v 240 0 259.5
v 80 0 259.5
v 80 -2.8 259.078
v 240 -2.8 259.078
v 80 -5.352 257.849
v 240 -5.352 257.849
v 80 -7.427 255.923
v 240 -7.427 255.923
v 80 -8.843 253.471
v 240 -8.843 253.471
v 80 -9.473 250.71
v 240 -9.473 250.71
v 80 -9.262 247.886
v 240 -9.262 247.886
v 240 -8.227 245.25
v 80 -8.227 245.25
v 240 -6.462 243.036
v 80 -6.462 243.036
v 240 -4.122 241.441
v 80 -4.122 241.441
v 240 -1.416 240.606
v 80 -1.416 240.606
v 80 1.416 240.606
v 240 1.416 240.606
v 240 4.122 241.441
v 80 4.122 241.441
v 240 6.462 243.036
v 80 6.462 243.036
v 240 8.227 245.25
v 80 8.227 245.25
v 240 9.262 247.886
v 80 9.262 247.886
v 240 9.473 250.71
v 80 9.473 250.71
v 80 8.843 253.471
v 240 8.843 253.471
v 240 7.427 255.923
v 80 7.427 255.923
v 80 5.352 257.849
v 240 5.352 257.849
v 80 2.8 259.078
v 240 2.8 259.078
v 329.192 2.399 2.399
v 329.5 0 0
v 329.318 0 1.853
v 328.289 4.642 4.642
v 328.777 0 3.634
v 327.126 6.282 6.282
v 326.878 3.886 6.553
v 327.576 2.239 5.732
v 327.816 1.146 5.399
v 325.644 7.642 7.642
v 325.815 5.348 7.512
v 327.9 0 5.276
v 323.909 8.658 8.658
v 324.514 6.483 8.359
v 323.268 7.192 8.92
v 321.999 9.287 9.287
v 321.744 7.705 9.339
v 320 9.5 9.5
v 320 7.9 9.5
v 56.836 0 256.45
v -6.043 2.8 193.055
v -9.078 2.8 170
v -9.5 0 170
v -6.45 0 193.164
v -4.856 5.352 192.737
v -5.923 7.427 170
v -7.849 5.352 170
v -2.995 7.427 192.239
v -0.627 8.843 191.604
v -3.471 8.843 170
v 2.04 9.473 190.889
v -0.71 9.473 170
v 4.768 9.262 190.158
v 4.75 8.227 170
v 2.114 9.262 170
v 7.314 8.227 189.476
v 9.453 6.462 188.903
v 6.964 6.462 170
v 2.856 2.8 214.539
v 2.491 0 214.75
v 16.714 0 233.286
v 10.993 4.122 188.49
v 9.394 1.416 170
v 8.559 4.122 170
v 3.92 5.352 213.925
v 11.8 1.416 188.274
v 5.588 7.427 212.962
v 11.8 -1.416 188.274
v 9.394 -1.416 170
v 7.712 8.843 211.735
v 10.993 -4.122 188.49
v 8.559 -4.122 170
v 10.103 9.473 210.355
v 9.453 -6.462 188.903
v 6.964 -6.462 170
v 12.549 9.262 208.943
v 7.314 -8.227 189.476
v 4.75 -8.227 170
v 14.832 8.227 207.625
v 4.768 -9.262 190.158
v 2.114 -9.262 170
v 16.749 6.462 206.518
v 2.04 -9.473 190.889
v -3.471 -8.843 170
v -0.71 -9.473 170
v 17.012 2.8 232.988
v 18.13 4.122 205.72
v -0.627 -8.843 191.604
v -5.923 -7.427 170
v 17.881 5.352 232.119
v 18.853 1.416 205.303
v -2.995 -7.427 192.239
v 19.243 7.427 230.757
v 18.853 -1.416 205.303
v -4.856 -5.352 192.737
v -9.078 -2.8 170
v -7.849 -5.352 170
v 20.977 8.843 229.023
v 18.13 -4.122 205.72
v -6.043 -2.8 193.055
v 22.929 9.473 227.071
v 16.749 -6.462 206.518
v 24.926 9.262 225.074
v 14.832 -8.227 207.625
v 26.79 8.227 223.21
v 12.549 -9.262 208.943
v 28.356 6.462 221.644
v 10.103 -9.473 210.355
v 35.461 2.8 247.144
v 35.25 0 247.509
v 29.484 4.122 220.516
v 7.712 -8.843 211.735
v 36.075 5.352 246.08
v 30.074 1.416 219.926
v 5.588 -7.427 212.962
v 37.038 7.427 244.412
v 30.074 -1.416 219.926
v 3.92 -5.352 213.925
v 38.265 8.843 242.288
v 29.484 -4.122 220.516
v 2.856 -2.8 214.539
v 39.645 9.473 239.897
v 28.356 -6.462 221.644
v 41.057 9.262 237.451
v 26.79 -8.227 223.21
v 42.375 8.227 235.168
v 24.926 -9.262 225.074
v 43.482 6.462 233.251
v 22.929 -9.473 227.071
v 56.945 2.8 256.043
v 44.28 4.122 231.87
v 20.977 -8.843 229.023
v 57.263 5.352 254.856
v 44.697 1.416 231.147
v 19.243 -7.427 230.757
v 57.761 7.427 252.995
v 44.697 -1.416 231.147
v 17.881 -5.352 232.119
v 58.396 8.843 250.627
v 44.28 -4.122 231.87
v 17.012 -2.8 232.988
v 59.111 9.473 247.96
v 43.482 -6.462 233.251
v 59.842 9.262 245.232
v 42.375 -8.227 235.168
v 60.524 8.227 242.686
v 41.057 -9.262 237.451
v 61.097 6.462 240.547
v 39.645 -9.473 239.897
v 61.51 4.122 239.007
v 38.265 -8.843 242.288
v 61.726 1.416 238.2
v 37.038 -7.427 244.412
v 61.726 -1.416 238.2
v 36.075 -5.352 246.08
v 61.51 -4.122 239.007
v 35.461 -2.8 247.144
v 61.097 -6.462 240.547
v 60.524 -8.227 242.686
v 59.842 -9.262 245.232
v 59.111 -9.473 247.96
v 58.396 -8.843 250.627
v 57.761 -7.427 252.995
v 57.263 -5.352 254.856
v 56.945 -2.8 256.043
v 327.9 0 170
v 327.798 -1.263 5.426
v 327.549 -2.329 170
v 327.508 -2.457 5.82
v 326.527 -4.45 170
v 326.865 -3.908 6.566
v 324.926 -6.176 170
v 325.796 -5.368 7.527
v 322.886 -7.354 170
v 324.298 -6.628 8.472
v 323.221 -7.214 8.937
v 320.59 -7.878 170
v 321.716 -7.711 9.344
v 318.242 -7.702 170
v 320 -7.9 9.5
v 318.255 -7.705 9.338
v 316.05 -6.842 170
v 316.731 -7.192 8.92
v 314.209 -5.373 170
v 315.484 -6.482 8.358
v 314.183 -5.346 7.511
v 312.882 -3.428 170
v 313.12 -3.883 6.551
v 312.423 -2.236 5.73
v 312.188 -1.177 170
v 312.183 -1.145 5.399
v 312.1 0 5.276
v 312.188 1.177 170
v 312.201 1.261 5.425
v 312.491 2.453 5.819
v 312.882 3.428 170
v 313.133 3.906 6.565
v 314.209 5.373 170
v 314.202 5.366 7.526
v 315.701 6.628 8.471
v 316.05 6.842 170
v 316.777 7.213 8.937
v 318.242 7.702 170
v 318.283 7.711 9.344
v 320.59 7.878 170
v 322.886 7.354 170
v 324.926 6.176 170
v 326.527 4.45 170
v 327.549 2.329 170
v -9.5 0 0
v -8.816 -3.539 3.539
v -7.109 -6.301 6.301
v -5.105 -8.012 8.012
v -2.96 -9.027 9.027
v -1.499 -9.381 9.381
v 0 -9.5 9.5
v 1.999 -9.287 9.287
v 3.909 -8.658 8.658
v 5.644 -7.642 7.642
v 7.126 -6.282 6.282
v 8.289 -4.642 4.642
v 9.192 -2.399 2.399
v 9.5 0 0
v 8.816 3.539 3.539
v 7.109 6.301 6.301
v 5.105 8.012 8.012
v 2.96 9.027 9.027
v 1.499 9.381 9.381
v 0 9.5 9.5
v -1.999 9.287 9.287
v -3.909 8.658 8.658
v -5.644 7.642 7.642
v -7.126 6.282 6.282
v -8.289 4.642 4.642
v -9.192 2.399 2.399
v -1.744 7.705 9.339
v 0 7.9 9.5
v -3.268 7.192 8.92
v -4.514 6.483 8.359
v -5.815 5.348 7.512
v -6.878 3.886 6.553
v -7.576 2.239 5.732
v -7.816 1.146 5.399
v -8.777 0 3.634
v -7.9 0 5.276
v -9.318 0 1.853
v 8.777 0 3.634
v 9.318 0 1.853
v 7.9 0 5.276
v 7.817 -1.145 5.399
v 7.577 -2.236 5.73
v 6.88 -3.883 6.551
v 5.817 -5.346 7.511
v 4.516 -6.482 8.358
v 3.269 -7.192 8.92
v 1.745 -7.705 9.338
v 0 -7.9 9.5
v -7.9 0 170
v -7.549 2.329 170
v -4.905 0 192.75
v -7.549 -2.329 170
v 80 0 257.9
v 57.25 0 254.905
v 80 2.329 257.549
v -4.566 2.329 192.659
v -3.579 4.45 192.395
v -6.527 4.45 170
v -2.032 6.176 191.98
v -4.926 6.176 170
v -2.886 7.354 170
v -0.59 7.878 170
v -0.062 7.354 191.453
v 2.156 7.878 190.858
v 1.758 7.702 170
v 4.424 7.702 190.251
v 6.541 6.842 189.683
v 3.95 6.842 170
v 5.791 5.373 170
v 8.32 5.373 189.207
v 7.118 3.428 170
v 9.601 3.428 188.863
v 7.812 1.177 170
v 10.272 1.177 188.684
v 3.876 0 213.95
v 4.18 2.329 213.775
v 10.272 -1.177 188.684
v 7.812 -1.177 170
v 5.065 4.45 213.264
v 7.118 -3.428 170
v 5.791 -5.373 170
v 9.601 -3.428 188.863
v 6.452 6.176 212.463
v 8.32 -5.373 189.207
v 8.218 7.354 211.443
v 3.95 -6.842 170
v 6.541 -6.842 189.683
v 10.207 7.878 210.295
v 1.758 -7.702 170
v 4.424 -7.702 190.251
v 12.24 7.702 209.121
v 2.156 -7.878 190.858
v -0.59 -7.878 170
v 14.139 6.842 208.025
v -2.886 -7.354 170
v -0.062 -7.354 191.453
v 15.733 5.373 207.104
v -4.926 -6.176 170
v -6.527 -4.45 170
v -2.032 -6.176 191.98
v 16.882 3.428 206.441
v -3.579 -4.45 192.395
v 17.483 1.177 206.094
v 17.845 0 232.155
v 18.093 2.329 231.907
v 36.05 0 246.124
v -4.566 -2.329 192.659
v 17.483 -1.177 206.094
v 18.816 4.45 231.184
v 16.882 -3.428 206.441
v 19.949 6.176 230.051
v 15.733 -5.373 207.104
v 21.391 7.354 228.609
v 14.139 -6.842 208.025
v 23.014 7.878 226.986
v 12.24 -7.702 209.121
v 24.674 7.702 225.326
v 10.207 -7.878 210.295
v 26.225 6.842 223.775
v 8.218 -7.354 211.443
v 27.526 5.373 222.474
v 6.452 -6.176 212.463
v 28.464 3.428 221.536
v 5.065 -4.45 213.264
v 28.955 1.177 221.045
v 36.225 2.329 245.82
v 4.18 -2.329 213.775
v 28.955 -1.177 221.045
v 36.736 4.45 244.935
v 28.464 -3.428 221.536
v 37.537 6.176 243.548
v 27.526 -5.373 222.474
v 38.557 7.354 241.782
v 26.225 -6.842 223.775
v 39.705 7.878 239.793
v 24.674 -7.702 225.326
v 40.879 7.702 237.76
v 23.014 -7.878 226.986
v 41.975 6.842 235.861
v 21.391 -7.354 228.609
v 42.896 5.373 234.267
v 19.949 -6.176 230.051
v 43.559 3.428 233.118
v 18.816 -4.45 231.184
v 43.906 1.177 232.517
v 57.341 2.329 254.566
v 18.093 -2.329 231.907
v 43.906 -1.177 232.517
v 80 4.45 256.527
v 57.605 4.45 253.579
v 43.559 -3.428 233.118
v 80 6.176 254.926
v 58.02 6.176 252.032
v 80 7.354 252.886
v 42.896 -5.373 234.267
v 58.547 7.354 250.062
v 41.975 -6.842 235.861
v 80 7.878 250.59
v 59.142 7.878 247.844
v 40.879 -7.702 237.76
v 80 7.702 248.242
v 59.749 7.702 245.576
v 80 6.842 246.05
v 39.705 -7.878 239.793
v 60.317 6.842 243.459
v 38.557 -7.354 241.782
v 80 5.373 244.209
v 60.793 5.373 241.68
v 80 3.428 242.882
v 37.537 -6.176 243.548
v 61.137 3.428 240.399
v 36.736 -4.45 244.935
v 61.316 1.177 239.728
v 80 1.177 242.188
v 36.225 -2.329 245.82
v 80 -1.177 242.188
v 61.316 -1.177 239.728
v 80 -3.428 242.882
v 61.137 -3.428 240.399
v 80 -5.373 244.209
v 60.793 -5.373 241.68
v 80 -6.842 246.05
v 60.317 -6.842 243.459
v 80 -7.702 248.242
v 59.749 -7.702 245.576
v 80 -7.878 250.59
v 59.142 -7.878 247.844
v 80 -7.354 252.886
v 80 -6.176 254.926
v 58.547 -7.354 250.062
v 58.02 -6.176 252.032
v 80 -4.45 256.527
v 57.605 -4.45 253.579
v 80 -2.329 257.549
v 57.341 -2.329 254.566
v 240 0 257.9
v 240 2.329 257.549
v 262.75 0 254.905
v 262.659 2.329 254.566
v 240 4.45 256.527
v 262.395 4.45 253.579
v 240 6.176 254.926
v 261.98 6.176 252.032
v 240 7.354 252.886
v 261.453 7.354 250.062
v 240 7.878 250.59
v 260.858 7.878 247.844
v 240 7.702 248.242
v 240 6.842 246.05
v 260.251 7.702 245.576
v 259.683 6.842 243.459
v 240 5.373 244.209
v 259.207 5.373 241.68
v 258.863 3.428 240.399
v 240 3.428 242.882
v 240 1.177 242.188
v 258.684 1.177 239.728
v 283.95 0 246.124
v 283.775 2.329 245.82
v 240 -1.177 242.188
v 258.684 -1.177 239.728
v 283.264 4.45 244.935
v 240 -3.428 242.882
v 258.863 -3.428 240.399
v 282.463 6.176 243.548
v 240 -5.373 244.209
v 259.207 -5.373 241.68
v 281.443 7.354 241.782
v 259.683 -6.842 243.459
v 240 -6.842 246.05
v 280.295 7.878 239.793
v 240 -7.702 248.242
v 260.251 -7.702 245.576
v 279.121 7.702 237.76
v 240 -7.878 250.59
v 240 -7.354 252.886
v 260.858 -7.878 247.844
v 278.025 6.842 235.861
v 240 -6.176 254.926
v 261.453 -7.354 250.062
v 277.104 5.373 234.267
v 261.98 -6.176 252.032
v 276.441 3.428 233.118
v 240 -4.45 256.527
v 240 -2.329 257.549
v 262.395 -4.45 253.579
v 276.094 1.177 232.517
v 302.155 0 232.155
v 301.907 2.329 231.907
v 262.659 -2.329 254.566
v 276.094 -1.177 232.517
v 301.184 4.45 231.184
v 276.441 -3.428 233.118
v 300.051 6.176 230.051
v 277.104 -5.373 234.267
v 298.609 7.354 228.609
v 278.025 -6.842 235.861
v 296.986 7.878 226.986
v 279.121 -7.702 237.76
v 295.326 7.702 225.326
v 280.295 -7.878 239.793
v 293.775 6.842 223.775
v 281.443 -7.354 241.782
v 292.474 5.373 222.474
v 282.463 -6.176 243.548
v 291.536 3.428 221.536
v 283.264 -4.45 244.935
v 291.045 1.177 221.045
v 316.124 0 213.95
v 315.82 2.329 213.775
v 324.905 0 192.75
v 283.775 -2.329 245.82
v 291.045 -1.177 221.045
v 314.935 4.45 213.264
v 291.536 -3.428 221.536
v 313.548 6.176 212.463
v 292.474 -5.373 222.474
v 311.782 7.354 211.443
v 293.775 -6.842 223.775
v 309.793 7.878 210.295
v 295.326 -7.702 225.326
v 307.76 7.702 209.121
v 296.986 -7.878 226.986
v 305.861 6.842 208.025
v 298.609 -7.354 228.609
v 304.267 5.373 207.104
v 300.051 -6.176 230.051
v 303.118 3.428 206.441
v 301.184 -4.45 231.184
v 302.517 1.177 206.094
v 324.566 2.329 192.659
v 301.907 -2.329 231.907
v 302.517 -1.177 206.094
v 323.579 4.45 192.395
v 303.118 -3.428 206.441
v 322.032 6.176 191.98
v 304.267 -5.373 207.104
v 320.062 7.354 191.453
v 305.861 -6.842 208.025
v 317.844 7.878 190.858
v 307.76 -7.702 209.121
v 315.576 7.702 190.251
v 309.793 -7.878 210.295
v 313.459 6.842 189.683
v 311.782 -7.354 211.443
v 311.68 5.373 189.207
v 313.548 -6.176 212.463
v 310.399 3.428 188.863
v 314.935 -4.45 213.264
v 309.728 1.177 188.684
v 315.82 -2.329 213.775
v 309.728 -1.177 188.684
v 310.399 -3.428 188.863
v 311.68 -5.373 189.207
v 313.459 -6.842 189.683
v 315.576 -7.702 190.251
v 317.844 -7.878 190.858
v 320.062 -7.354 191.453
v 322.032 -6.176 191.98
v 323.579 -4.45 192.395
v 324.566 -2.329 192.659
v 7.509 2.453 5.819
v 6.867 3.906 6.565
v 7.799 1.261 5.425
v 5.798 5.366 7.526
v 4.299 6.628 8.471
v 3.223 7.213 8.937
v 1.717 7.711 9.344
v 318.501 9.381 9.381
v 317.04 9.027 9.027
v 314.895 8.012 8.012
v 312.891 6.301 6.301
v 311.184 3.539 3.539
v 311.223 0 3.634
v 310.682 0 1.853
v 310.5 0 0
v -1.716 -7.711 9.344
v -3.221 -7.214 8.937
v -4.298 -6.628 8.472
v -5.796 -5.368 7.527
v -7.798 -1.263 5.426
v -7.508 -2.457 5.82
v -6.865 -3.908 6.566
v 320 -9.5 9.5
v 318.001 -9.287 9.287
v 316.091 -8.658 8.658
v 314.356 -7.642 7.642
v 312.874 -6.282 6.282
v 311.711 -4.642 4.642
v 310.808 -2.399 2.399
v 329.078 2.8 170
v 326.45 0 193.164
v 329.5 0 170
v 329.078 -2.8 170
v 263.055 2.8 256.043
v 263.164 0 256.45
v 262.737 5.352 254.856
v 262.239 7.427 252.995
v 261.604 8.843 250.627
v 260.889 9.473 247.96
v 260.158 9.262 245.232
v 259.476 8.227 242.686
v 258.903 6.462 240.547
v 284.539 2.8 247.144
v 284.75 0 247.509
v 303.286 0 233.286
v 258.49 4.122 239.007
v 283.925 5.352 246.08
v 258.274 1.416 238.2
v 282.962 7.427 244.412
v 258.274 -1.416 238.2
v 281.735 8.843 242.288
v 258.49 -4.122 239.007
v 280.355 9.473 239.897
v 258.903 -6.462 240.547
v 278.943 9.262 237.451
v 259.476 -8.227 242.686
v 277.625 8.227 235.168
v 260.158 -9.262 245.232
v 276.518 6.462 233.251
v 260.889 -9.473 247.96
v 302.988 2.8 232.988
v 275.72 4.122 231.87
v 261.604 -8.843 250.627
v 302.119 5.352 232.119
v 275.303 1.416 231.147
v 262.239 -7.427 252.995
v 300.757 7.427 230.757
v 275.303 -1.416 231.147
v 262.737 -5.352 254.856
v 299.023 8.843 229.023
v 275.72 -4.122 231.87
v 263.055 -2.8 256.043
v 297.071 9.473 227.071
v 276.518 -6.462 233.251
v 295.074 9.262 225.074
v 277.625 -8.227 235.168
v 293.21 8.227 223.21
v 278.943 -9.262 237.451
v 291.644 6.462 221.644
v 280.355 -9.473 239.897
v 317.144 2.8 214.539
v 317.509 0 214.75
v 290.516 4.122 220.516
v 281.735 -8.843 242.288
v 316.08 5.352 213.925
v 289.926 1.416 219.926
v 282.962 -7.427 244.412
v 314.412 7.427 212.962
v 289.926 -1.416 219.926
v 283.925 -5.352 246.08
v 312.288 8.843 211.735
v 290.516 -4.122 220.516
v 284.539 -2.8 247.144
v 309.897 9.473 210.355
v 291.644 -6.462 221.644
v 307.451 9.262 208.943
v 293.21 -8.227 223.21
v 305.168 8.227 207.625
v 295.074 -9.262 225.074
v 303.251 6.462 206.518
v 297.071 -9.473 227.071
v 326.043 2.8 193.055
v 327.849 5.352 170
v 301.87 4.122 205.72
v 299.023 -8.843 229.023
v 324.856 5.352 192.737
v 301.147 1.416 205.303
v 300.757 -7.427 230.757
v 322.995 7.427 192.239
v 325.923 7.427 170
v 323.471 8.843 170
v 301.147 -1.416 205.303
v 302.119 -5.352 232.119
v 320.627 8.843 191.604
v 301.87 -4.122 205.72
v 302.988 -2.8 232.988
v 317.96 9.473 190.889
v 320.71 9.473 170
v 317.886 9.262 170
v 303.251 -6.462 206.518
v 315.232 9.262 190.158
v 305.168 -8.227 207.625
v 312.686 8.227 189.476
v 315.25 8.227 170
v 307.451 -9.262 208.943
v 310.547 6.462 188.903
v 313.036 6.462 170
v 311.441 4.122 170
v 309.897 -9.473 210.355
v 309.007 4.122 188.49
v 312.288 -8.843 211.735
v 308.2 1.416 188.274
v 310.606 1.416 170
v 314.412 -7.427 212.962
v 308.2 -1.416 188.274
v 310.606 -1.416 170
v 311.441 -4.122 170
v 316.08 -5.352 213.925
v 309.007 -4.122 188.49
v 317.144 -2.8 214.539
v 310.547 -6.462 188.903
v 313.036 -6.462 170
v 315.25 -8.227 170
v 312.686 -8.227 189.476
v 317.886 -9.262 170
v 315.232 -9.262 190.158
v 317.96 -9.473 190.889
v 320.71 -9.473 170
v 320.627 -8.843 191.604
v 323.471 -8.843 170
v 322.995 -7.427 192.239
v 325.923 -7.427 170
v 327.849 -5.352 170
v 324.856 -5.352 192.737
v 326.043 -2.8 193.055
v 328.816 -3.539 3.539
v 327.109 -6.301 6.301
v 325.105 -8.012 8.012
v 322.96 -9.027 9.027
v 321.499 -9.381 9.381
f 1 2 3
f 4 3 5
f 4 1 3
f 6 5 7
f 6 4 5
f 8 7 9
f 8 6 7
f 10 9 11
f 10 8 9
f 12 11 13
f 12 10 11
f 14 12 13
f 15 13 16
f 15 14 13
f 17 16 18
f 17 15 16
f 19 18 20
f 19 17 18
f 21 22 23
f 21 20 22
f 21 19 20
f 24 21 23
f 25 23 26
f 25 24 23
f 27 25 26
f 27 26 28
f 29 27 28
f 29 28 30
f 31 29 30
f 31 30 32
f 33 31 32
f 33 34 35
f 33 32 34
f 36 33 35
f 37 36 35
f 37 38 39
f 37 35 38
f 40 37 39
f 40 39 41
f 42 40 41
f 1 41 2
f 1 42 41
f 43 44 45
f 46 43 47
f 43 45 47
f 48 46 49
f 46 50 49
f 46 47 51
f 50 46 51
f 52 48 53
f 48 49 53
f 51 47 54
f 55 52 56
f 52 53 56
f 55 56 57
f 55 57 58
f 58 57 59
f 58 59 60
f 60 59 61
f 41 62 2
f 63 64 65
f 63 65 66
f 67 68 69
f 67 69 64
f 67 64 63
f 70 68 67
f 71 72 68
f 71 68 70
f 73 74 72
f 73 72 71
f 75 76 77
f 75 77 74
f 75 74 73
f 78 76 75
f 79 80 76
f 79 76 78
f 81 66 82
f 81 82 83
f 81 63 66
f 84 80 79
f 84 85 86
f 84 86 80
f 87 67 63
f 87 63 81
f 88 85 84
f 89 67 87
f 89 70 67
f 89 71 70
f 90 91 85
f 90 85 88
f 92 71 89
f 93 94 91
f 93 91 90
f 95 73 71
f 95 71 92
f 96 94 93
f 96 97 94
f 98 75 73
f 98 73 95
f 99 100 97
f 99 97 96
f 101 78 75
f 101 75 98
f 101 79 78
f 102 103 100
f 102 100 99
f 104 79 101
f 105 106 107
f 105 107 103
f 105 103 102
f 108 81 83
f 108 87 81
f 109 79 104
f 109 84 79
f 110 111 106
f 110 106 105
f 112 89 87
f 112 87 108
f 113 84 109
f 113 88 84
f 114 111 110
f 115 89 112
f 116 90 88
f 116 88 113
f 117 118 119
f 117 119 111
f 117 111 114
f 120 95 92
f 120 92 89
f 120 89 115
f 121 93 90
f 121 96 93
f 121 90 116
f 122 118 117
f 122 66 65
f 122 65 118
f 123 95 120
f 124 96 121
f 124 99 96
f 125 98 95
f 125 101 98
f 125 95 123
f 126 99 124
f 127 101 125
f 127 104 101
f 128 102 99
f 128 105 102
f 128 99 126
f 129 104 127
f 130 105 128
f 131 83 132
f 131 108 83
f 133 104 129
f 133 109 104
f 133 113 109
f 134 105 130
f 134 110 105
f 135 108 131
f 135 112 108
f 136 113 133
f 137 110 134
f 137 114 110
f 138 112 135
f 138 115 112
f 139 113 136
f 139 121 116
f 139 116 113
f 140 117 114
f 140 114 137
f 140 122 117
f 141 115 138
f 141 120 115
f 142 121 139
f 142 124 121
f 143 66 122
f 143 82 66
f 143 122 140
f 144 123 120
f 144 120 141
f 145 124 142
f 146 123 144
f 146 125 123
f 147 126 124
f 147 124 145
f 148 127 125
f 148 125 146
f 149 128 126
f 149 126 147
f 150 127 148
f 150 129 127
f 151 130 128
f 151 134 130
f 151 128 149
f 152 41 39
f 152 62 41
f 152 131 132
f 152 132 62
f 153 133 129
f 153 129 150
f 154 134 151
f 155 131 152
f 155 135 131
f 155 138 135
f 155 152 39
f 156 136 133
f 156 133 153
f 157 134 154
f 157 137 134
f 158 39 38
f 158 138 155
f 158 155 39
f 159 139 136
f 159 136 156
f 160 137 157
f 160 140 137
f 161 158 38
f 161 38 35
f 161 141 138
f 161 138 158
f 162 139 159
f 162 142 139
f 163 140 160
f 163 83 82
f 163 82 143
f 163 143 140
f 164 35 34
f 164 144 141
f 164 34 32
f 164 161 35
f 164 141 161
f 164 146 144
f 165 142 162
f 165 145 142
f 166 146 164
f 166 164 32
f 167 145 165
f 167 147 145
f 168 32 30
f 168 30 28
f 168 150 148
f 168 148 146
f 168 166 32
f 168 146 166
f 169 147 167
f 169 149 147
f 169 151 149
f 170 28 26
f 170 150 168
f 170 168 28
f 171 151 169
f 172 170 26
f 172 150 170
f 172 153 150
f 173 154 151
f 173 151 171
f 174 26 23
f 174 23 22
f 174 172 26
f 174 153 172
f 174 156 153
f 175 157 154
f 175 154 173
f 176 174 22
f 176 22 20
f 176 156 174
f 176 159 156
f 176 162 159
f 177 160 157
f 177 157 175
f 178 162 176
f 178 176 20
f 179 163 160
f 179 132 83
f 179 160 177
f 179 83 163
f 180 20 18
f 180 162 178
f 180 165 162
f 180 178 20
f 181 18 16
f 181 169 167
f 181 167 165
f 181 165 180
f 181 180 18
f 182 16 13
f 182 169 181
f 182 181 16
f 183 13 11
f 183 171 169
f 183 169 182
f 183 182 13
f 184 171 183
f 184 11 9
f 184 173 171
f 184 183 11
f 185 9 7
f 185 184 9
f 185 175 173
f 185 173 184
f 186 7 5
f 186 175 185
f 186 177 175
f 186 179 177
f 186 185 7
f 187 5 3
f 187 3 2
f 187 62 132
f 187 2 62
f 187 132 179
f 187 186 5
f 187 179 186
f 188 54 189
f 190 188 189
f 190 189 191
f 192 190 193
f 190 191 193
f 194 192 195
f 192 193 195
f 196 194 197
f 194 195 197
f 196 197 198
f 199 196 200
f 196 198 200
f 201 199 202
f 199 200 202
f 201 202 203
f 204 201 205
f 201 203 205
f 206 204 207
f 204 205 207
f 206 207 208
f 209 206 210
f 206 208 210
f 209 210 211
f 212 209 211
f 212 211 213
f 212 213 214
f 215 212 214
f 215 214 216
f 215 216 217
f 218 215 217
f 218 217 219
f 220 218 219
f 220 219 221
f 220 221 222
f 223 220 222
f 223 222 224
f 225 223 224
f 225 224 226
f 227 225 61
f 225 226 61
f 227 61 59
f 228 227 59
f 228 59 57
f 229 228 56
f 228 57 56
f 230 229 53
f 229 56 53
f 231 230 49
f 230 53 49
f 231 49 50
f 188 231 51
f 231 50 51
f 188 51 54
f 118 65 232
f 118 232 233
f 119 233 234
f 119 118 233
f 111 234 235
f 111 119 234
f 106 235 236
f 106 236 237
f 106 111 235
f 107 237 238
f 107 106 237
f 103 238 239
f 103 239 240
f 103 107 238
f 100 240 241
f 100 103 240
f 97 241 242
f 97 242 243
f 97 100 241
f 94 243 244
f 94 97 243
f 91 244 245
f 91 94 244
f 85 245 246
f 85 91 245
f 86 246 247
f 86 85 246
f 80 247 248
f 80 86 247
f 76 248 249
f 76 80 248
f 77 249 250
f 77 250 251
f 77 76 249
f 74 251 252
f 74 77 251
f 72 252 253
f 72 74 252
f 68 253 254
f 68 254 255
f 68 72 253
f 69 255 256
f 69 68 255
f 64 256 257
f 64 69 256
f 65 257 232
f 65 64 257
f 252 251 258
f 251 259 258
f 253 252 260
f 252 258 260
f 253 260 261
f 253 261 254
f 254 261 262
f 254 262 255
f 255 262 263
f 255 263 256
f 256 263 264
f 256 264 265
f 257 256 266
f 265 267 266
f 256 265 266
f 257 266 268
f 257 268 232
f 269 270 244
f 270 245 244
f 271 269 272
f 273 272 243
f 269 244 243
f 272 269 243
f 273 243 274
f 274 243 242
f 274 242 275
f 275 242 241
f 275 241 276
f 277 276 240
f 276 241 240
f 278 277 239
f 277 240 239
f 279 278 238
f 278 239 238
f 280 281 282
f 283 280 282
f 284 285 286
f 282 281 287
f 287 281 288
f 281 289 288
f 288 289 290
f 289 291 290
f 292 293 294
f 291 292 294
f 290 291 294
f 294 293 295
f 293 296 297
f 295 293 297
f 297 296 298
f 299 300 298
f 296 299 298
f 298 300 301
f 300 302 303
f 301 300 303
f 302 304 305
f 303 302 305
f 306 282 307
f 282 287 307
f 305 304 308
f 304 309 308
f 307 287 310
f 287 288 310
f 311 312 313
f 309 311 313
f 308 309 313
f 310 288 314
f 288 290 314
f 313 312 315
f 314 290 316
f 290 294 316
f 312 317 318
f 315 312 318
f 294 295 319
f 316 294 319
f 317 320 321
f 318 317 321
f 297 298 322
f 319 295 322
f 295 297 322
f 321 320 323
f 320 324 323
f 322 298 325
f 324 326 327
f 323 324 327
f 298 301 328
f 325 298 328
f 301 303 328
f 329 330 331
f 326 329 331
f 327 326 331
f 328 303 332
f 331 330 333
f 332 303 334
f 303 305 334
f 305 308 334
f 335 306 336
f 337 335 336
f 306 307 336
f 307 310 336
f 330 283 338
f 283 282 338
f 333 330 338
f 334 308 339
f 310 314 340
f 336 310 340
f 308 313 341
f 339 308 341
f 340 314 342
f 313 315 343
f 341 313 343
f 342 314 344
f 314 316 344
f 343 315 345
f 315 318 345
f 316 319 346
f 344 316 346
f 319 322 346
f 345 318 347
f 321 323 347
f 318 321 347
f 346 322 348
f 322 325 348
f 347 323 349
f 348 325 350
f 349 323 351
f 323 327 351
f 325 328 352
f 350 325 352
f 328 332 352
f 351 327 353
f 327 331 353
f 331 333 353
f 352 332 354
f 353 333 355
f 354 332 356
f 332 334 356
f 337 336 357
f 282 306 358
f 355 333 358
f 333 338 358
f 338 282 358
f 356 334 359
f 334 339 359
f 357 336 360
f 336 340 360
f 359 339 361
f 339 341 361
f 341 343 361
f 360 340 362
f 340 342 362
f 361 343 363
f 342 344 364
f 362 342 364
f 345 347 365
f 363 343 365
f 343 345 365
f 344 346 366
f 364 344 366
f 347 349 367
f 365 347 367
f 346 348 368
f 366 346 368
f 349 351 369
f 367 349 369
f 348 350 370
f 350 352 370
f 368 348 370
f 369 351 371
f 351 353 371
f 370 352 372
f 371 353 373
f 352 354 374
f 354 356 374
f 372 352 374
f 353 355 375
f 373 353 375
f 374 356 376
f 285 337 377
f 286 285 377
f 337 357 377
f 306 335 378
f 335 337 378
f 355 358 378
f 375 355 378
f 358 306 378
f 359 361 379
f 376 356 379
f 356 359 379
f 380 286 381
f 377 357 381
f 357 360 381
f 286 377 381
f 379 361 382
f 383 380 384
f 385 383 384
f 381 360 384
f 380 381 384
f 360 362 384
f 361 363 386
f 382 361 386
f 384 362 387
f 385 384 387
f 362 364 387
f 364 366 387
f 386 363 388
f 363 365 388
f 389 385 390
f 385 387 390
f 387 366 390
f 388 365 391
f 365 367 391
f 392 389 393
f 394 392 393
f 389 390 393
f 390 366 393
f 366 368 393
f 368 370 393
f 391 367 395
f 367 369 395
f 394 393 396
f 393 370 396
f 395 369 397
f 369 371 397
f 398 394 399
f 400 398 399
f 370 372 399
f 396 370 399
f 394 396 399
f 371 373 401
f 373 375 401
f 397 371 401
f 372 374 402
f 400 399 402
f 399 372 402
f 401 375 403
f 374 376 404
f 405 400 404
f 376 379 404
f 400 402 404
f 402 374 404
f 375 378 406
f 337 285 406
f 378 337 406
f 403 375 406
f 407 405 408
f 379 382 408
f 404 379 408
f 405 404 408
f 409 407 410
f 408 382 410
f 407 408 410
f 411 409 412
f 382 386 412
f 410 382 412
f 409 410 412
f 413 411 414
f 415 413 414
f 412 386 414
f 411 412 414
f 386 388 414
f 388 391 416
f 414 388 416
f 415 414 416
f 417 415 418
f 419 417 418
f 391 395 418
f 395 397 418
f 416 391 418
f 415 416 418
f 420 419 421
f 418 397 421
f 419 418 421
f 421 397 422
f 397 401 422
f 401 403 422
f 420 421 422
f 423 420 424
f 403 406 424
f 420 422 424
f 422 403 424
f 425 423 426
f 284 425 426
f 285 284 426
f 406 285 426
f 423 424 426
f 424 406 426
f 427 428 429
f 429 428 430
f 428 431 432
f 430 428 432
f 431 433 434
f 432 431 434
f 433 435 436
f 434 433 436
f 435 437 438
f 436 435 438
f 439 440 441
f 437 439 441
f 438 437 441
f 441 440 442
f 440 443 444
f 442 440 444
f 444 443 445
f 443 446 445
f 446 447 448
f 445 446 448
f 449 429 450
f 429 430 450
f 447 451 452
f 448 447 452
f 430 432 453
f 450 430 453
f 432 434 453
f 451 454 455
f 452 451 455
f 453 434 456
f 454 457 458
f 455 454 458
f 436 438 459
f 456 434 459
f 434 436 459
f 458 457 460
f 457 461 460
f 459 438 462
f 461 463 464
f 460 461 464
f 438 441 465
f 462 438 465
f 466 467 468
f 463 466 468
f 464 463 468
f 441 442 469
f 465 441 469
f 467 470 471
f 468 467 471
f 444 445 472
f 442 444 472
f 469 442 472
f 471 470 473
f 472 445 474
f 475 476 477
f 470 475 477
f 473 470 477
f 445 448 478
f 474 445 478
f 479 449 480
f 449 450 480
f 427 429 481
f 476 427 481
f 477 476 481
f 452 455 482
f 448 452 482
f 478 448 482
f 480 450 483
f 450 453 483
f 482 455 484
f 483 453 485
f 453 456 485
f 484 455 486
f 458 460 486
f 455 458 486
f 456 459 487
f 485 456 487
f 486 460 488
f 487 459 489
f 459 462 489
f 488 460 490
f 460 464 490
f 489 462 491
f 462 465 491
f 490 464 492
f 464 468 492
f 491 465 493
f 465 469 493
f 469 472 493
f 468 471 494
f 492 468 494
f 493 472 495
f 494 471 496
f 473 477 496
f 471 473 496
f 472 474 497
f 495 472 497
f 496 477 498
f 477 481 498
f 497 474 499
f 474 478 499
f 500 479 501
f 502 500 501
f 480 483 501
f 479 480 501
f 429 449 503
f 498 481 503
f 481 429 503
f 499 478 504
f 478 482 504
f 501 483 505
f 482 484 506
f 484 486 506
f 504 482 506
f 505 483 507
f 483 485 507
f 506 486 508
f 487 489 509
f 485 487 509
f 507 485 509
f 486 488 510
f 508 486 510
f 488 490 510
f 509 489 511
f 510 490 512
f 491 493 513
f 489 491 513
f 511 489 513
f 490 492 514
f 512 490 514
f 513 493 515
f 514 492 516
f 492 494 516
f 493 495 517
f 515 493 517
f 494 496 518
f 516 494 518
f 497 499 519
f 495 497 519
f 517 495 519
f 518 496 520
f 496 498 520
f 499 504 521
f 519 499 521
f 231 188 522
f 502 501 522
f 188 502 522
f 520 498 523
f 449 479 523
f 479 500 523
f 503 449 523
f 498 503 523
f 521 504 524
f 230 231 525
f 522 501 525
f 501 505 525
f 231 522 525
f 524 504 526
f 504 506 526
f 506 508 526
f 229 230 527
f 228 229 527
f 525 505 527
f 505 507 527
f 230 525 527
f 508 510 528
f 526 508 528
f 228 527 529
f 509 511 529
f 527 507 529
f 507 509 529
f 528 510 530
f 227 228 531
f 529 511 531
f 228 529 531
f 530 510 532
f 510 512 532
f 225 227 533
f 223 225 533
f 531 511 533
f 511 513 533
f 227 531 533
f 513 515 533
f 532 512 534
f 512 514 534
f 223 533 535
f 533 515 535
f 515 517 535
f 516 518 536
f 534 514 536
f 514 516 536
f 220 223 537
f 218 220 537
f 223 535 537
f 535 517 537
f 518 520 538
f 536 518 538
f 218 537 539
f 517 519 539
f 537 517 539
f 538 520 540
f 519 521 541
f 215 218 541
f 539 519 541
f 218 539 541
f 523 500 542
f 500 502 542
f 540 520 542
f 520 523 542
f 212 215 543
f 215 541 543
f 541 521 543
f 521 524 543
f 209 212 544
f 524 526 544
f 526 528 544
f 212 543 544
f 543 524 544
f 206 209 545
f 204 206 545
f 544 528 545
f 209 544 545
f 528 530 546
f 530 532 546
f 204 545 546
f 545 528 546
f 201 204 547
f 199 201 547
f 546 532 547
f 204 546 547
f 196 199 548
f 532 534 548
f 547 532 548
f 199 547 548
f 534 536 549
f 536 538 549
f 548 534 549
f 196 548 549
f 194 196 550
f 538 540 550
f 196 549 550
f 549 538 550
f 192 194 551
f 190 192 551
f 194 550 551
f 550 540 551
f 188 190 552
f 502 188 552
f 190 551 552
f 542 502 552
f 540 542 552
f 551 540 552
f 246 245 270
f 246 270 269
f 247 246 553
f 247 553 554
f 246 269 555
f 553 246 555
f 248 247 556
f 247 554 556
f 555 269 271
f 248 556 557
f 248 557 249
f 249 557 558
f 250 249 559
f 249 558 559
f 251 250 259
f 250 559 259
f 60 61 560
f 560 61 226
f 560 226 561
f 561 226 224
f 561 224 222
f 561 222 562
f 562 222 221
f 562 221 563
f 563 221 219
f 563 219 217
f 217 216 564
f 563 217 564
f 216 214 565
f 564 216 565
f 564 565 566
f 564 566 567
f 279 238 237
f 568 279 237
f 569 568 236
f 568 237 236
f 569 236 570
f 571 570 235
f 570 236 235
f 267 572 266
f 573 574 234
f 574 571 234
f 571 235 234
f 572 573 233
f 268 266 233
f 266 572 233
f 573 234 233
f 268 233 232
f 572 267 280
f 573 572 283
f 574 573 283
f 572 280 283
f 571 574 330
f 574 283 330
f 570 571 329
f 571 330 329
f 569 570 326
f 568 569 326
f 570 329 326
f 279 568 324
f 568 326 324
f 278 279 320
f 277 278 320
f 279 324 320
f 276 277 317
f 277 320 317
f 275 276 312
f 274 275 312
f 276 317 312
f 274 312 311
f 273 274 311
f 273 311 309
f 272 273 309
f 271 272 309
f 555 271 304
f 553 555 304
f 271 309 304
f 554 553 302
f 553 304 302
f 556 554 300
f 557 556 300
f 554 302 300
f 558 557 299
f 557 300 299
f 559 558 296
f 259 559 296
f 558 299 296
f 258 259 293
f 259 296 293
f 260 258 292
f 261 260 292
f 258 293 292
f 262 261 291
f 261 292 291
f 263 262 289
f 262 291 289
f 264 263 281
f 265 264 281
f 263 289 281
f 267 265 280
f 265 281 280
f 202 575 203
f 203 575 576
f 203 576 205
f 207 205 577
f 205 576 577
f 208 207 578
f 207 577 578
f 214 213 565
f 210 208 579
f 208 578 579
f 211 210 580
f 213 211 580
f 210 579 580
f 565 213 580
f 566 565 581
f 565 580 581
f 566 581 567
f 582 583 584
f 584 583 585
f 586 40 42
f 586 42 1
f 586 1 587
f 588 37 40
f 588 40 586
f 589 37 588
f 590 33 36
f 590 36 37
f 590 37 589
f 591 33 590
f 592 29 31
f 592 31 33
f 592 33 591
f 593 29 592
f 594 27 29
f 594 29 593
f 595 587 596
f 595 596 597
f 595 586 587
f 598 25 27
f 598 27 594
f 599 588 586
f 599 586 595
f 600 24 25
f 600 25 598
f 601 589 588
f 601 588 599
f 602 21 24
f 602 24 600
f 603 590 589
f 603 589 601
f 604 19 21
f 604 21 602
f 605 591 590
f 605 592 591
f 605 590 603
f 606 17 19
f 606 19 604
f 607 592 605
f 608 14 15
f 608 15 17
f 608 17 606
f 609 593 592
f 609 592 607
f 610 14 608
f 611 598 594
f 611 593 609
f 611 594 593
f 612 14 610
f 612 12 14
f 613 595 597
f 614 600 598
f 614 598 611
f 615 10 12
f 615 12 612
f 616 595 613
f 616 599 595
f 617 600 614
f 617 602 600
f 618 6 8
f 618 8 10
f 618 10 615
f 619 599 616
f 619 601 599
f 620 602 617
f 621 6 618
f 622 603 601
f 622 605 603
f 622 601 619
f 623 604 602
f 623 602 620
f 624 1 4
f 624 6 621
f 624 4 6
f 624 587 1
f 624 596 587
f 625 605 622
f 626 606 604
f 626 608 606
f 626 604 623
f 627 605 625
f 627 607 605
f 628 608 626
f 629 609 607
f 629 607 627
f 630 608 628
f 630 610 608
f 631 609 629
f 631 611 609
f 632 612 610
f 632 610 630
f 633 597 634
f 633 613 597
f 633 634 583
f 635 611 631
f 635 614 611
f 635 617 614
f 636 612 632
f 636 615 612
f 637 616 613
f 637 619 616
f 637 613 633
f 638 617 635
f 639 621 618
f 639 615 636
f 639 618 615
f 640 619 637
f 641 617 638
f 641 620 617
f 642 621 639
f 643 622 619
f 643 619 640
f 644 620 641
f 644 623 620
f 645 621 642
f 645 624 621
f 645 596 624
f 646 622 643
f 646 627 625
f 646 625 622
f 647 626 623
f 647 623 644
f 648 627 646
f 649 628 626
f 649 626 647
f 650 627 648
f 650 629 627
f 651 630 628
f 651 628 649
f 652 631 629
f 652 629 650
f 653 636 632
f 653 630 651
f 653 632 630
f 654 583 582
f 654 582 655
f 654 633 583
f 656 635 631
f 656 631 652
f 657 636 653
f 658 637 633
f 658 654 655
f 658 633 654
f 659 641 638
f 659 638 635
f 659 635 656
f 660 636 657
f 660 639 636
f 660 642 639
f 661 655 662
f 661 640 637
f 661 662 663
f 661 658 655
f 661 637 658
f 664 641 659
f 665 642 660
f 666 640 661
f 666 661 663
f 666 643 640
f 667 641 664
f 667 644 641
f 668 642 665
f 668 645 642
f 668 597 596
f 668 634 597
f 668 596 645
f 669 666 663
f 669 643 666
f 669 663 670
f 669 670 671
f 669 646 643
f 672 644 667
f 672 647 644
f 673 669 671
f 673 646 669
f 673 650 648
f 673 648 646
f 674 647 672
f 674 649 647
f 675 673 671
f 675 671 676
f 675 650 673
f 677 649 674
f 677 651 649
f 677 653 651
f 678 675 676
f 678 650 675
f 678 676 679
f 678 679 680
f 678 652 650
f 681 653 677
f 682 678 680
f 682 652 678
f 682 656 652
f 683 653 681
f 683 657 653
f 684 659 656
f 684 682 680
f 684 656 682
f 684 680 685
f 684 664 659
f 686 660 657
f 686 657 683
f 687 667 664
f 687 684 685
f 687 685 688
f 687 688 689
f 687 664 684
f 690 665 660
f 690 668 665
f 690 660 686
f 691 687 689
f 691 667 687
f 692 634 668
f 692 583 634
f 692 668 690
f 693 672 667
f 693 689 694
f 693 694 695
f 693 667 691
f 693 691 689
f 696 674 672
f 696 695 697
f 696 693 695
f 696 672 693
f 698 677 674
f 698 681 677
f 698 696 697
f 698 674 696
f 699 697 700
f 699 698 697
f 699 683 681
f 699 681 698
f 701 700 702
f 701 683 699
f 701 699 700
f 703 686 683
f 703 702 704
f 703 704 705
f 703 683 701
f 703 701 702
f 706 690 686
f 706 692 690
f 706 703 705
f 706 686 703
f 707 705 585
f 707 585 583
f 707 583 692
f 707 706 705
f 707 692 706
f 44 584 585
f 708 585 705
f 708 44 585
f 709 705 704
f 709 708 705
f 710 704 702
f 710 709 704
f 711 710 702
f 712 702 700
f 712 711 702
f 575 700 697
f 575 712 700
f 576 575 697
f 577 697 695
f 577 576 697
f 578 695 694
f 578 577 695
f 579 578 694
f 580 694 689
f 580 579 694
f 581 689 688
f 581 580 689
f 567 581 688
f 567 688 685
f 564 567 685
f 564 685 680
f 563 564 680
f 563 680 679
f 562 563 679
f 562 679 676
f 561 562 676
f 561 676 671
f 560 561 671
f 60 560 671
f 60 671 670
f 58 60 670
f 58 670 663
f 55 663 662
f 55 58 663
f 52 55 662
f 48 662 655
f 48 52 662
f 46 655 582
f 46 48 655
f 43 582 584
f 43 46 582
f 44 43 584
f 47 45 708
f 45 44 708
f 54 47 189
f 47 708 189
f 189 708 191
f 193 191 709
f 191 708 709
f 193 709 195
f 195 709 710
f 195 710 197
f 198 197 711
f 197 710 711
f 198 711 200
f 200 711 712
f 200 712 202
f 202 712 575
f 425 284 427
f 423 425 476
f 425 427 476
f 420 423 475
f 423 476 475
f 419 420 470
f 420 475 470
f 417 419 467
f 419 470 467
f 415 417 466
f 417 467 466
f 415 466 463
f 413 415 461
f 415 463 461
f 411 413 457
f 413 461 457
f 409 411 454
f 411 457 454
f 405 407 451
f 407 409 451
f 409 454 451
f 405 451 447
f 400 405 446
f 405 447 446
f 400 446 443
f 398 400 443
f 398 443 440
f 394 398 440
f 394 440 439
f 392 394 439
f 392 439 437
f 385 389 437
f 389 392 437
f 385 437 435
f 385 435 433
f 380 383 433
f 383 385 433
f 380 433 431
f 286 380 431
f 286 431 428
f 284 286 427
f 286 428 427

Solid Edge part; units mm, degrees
sketch "Sketch1" plane through (0, 0, 0) normal (0, -1, 0) x (1, 0, 0)
  line L0 (0, 0) -> (0, 170)
  arc A0 (0, 170) -> (80, 250) centre (80, 170) cw
  line L1 (80, 250) -> (240, 250)
  arc A1 (240, 250) -> (320, 170) centre (240, 170) cw
  line L2 (320, 170) -> (320, 0)
  dimension "D1" = 80
  dimension "D2" = 250
  dimension "D3" = 320
sketch "Sketch2" plane through (0, 0, 0) normal (0, 0, -1) x (-1, 0, 0)
  circle A0 centre (0, 0) radius 9.5
  dimension "D1" = 19
sweep "SweptProtrusion_1" add profiles "Sketch2" path "Sketch1"
shell "Thinwall_1" thickness 1.6 removed faces 4 at (6.5233, -6.1433, 0) at (313.4767, -6.1433, 0) at (6.5233, -6.1433, 0) at (313.4767, -6.1433, 0)
hole "Hole_3" at (0, 0, 0) direction (0, -1, 0) diameter 19 end through all both ways yes
hole "Hole1" at (320, 0, 0) direction (0, -1, 0) diameter 19 end through all both ways yes
properties material "Aluminum, 1060"
